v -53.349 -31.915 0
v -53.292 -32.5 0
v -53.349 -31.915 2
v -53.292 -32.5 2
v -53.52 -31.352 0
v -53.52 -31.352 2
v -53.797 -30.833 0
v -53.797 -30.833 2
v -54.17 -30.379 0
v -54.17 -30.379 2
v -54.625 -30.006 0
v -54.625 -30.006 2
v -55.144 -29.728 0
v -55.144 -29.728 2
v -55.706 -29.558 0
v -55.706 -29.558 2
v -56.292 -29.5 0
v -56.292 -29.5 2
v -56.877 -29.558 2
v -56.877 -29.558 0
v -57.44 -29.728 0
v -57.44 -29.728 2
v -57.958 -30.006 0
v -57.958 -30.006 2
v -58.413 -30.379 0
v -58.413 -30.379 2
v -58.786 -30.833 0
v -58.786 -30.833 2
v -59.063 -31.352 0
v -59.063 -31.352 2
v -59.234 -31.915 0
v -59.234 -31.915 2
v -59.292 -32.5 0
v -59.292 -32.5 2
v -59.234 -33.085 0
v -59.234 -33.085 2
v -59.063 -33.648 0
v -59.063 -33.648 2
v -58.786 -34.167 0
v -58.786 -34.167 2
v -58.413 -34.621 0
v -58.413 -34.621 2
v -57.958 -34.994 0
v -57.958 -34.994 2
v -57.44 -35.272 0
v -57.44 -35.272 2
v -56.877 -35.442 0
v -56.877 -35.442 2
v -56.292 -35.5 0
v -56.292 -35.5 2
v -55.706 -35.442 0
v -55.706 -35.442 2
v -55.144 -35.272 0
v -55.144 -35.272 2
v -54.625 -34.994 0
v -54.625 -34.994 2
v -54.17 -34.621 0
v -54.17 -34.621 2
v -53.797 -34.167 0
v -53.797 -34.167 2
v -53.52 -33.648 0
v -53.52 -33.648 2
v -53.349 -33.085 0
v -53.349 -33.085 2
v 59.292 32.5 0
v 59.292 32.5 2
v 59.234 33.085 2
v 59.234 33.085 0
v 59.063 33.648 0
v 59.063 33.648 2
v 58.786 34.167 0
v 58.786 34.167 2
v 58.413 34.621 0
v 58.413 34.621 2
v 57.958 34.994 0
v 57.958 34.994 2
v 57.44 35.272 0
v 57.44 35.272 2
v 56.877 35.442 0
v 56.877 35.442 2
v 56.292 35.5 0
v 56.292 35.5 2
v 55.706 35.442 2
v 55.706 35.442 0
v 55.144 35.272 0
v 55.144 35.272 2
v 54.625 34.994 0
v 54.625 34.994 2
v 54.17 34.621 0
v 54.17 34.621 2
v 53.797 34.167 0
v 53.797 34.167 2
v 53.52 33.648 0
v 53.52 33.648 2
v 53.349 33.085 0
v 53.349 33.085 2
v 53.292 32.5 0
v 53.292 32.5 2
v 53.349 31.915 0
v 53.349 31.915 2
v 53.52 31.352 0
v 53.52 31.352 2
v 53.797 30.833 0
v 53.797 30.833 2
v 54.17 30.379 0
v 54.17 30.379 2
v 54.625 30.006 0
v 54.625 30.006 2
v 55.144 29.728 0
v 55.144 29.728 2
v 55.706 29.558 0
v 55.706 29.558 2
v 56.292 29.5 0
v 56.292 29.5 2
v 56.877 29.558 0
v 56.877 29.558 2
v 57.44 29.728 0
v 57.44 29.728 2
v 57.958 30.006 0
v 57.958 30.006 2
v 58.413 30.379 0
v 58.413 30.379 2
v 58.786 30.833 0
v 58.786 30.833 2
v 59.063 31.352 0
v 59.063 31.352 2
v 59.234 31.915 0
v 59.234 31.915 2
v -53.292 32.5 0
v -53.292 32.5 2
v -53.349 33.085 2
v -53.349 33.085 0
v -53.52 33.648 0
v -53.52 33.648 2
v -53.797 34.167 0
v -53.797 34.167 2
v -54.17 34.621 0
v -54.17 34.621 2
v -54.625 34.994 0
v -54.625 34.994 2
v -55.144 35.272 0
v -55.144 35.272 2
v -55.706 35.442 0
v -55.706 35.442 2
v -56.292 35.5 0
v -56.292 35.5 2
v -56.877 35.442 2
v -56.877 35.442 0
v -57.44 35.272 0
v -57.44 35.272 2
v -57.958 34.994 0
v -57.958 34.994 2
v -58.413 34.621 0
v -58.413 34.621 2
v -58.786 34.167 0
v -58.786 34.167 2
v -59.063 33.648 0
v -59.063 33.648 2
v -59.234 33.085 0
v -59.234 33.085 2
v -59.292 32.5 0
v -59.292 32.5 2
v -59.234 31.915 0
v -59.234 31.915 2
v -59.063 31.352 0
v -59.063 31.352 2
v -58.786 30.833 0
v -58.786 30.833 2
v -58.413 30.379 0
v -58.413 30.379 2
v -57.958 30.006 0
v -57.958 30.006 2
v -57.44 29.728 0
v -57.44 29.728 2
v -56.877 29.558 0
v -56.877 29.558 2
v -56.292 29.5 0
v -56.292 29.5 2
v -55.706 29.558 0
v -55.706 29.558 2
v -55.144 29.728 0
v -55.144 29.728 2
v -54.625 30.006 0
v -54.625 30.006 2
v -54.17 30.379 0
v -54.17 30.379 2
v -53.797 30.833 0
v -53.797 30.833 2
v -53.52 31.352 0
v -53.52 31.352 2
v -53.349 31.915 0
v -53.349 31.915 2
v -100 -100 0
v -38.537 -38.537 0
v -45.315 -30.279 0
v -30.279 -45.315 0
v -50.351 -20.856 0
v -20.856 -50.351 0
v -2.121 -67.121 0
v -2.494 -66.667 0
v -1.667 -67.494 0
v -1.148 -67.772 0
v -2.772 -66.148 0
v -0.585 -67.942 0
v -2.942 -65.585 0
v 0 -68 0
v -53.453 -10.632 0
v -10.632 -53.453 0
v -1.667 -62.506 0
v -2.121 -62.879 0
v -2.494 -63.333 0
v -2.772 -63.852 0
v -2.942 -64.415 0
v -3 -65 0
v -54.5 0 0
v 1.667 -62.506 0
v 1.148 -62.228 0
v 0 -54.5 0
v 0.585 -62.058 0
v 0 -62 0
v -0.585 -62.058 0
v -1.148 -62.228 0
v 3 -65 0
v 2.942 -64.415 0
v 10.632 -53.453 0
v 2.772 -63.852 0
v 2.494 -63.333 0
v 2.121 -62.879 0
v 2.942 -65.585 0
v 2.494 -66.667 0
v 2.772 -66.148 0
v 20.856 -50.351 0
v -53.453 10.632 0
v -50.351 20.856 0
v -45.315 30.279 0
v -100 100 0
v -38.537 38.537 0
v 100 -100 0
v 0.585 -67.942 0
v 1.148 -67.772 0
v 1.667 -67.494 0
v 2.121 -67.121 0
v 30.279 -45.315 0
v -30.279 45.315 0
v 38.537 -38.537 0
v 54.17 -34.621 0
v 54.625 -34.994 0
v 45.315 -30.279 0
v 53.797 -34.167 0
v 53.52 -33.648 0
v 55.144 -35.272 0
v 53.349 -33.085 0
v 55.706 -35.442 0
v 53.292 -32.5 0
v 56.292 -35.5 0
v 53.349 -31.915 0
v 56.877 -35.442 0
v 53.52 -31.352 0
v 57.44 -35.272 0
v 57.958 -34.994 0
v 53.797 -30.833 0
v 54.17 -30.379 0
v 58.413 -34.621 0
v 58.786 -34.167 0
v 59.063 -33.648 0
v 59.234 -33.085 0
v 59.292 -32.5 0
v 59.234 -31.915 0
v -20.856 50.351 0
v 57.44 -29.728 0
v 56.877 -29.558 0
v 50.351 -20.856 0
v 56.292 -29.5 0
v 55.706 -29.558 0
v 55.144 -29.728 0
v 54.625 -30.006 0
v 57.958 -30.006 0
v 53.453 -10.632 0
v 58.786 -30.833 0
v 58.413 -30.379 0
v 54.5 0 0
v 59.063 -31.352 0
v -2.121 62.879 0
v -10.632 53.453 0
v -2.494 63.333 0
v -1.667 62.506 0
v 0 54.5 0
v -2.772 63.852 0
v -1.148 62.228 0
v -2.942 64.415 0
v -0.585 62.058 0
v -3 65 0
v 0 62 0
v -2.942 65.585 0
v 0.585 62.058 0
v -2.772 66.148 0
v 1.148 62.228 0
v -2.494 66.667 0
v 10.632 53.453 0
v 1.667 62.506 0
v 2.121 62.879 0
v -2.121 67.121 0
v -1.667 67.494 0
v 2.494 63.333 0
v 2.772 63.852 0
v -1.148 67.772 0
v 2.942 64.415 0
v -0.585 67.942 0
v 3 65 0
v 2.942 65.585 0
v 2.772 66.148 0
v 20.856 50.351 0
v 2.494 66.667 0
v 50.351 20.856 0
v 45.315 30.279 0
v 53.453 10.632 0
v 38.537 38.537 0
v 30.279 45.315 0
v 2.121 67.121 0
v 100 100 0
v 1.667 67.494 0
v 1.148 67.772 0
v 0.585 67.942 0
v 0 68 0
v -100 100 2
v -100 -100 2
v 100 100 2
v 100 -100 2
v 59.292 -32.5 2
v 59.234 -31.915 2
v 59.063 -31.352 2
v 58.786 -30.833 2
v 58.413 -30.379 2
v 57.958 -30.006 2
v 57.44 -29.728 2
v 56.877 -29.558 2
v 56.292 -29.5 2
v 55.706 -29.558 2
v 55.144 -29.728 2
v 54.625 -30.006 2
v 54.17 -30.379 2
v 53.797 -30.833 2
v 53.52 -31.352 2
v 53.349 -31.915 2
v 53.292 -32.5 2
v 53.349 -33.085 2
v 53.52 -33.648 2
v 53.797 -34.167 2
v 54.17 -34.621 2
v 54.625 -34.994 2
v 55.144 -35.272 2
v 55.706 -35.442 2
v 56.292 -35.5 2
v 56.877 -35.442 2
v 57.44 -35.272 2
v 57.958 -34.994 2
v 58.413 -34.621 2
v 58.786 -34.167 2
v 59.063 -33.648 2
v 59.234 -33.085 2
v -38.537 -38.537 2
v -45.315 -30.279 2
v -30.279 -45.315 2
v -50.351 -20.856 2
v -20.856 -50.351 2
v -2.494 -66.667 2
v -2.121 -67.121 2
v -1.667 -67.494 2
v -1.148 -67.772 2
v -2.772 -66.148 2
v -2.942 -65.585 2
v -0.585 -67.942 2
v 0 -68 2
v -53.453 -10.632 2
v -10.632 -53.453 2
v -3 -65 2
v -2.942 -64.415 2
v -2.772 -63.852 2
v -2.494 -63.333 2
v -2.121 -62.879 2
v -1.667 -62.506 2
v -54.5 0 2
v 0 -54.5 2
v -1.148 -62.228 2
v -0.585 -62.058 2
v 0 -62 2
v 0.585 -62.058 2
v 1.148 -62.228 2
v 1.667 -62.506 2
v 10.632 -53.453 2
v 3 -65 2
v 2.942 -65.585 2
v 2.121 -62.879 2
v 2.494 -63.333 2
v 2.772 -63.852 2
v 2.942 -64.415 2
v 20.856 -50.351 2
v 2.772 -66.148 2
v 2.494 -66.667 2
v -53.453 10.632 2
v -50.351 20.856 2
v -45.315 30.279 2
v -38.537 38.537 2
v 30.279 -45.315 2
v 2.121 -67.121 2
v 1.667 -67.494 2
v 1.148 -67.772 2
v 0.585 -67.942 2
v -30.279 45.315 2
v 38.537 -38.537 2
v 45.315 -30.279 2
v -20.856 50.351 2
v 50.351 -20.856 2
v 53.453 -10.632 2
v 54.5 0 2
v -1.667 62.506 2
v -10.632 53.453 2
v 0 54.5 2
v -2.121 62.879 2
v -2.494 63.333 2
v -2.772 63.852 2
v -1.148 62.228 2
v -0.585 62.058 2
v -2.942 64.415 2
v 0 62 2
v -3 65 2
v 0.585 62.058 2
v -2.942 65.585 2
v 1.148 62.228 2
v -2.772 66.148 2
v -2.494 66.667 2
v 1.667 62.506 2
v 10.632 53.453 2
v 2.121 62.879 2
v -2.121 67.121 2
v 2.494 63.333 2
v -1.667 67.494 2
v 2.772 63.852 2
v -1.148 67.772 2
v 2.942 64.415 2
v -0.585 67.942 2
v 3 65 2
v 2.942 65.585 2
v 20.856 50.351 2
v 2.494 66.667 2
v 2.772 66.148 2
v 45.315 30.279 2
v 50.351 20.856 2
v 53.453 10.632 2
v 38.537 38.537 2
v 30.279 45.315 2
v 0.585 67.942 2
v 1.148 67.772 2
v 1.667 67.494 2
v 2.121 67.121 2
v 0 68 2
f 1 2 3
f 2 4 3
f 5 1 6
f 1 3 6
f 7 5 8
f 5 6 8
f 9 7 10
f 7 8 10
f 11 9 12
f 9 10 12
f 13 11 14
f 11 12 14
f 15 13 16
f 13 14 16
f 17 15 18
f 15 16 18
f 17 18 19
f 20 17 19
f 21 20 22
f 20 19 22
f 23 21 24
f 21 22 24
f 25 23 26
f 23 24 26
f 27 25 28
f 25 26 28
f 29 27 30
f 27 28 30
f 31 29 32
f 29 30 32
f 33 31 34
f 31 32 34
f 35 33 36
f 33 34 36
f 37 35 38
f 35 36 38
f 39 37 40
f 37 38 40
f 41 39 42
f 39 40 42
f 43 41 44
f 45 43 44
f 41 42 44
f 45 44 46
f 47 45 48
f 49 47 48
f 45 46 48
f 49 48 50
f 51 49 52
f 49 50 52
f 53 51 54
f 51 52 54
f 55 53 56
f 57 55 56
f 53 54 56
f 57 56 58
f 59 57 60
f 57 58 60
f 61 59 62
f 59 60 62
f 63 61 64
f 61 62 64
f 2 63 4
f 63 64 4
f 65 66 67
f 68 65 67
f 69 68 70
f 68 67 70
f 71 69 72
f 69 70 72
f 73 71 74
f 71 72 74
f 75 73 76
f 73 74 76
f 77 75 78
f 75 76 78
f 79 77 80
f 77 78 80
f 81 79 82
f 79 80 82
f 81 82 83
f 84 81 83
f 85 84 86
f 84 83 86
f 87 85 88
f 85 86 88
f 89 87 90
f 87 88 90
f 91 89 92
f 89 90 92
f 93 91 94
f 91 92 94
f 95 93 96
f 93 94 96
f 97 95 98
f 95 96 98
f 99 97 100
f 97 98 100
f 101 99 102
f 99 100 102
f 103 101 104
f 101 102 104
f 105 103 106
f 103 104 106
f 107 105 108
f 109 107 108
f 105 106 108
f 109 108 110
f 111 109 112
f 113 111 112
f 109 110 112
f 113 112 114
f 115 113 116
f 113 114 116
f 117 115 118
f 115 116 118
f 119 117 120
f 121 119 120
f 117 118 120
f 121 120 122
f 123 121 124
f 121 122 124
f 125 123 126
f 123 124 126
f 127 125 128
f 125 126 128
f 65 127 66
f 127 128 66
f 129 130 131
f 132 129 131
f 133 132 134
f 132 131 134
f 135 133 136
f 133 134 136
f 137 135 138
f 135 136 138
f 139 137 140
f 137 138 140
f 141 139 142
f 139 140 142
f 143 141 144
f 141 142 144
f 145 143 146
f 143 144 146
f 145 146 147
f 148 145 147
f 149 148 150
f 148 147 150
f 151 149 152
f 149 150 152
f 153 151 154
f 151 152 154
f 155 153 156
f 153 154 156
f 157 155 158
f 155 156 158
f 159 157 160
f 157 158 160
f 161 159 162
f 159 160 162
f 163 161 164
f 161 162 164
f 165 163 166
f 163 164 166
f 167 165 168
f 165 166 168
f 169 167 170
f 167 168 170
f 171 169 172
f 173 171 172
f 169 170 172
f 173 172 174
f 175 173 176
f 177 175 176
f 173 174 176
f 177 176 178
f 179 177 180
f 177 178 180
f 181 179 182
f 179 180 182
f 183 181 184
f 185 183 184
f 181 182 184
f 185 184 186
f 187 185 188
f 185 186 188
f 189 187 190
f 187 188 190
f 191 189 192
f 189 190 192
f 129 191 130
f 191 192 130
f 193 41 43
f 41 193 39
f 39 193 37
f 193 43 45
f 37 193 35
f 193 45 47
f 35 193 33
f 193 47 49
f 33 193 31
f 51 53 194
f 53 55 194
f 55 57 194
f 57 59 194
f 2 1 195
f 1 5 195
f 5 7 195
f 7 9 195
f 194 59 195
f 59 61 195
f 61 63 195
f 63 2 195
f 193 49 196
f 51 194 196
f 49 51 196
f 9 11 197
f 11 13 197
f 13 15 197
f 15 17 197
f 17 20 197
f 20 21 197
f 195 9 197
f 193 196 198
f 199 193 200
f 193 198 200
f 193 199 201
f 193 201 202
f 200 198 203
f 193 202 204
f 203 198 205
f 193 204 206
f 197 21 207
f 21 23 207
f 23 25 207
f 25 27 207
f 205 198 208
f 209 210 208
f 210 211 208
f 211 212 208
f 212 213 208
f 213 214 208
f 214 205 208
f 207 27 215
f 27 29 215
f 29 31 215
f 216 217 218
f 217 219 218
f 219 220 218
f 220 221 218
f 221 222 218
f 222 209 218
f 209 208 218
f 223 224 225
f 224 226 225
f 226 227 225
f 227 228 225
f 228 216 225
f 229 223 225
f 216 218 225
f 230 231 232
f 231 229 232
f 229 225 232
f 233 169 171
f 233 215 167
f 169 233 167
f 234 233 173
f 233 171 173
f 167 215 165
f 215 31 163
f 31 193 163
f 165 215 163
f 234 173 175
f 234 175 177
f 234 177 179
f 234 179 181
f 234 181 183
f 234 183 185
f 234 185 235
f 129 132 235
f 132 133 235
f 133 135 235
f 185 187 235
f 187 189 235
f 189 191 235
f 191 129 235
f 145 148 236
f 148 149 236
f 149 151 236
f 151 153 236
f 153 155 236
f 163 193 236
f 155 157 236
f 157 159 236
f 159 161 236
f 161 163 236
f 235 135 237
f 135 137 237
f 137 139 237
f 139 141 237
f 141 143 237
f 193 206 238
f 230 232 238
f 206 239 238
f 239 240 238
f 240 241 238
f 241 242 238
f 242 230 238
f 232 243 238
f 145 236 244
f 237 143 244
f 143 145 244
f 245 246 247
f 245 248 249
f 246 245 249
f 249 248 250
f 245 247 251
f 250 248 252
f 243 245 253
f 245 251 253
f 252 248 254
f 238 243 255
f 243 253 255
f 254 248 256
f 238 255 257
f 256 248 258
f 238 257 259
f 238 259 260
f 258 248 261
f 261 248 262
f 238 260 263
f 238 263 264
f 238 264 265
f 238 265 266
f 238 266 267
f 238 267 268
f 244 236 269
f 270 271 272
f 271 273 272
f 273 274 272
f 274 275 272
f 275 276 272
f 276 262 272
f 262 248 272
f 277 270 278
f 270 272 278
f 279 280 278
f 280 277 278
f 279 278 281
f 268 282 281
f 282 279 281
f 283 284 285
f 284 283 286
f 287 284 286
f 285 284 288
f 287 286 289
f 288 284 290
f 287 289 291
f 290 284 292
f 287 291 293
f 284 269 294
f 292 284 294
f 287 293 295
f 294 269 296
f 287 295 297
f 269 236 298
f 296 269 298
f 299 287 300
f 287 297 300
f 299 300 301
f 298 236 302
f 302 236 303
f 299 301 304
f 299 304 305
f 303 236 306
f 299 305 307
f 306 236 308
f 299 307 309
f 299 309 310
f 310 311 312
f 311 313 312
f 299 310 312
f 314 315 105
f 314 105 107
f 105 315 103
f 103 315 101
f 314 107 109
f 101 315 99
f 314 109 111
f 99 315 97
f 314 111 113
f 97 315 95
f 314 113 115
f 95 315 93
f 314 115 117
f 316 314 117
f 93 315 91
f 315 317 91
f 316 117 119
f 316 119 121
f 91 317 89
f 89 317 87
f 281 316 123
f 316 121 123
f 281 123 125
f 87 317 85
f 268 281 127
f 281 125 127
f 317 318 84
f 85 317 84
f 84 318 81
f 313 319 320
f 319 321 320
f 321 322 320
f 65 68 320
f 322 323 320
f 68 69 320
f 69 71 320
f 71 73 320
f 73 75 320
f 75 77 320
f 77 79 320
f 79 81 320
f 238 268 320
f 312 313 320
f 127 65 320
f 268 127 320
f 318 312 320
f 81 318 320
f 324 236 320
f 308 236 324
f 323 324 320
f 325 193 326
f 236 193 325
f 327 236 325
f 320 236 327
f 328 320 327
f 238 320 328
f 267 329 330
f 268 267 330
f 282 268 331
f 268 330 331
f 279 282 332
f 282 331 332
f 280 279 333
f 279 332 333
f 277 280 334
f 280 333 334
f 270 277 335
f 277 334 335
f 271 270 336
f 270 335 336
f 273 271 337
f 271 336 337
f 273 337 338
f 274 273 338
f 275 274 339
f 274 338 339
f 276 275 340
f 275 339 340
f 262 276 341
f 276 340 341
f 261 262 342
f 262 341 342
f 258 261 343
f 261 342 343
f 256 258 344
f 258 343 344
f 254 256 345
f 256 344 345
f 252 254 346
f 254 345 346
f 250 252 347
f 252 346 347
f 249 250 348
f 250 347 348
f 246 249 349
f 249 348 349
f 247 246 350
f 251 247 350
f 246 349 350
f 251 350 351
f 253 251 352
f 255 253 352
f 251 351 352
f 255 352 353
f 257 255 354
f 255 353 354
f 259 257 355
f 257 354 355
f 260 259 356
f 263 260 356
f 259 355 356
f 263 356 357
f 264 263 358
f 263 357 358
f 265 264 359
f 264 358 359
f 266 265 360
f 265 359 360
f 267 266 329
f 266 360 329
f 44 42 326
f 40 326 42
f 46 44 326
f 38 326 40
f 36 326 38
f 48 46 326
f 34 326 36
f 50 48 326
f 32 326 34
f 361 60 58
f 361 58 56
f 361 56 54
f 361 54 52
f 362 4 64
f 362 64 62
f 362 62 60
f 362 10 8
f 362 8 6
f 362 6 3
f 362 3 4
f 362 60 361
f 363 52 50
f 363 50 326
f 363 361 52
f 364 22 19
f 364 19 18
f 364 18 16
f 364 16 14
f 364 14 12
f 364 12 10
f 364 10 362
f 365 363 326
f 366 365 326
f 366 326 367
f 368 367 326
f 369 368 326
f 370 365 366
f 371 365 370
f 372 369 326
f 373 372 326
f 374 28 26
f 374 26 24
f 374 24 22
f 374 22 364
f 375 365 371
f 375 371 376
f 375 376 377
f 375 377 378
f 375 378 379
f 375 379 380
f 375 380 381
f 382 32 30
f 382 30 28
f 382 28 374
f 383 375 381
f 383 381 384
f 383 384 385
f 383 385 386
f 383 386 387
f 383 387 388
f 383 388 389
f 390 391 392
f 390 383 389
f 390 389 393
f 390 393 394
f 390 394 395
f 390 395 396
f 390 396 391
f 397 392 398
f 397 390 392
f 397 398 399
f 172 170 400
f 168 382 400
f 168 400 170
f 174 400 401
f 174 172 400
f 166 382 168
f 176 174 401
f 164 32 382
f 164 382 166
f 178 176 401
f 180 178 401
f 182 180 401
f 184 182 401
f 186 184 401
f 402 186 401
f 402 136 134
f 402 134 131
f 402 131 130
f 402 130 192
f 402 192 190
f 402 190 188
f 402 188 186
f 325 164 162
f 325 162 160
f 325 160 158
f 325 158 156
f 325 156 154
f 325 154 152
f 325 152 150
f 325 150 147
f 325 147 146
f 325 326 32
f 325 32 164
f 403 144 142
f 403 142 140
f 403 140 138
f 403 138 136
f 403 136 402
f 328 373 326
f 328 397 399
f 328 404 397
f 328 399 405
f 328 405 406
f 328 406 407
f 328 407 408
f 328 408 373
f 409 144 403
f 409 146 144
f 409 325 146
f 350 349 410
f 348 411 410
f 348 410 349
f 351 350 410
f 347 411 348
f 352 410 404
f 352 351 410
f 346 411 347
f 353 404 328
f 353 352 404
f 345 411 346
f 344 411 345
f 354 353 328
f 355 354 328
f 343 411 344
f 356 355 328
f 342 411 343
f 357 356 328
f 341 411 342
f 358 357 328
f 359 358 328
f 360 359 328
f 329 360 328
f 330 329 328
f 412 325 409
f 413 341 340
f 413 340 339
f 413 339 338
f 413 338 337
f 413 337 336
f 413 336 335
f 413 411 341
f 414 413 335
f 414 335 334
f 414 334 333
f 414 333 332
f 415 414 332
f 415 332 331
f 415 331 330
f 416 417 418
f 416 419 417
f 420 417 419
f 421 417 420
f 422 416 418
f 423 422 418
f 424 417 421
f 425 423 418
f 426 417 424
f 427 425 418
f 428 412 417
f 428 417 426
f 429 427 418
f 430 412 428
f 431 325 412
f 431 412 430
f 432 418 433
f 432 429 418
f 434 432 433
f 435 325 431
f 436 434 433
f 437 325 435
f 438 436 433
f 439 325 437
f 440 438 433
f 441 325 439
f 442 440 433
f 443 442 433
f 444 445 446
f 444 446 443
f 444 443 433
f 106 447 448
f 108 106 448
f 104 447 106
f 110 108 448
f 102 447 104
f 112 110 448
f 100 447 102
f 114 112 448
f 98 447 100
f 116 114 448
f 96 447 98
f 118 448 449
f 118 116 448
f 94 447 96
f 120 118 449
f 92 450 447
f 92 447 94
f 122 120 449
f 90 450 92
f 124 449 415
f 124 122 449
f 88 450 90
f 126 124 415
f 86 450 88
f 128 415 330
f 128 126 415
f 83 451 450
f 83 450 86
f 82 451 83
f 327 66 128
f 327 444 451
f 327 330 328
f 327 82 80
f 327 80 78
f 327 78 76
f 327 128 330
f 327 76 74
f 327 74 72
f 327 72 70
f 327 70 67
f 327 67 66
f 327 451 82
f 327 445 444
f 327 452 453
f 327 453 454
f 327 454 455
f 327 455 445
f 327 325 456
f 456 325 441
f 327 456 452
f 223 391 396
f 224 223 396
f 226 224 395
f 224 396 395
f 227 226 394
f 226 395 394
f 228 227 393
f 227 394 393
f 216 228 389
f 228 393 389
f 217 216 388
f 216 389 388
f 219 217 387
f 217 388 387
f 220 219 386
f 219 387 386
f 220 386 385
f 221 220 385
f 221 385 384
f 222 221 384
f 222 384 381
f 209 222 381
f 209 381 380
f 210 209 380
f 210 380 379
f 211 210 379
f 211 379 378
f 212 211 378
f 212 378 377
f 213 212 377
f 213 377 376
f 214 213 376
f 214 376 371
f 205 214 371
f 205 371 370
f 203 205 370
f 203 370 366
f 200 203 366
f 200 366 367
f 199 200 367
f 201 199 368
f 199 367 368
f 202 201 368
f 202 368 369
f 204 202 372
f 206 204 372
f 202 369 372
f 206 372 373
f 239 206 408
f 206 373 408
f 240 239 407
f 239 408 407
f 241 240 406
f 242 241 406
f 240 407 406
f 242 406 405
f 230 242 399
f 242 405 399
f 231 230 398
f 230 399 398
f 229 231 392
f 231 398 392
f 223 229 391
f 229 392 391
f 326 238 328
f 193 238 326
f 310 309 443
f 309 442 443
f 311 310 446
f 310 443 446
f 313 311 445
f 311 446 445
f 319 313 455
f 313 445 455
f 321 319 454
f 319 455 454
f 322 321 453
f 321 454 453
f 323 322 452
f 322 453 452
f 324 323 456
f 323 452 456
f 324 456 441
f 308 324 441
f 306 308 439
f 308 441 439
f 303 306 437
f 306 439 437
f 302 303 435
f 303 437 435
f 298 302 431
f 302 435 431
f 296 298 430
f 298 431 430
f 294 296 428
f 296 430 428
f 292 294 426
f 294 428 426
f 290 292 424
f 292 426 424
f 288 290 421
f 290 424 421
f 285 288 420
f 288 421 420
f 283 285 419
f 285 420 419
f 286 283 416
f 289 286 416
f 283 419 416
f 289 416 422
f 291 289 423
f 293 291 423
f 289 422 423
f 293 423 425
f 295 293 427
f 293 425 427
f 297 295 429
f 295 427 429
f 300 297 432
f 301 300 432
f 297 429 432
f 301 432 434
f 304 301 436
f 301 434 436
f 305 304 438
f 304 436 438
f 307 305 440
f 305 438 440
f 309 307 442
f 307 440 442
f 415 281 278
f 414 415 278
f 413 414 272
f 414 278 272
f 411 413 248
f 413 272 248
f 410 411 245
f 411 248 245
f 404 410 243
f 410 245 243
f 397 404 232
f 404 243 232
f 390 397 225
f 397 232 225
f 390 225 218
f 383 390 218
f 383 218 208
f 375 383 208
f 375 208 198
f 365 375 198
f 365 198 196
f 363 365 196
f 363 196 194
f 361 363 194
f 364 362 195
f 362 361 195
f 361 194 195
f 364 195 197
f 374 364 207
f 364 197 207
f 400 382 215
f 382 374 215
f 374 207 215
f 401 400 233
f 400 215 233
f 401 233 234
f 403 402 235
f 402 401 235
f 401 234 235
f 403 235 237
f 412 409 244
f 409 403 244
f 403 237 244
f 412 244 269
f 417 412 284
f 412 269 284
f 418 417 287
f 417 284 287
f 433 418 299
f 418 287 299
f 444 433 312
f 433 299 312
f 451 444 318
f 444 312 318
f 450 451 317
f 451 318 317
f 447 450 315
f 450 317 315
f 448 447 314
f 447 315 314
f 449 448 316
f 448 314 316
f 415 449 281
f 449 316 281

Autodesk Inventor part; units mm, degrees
ref_plane "YZ Plane" through (0, 0, 0) normal (1, 0, 0) x (0, 1, 0)
ref_plane "XZ Plane" through (0, 0, 0) normal (0, 1, 0) x (-1, 0, 0)
ref_plane "XY Plane" through (0, 0, 0) normal (0, 0, 1) x (1, 0, 0)
sketch "Sketch1" plane through (0, 0, 0) normal (0, 0, 1) x (1, 0, 0)
  circle A0 centre (0, 0) radius 54.5
  line L0 (-100, 100) -> (100, 100)
  line L1 (100, 100) -> (100, -100)
  line L2 (100, -100) -> (-100, -100)
  line L3 (-100, -100) -> (-100, 100)
  dimension "d0" = 109
  dimension "d3" = 200
  dimension "d4" = 200
extrude "Extrusion1" add sketch "Sketch1" along normal blind 2
sketch "Sketch2" plane through (0, 0, 2) normal (0, 0, 1) x (1, 0, 0)
  circle A0 centre (0, 65) radius 3
  circle A1 centre (-56.2917, 32.5) radius 3
  circle A2 centre (-56.2917, -32.5) radius 3
  circle A3 centre (0, -65) radius 3
  circle A4 centre (56.2917, -32.5) radius 3
  circle A5 centre (56.2917, 32.5) radius 3
  circle A6 centre (0, 0) radius 65
  dimension "d8" = 6
  dimension "d11" = 360
extrude "Extrusion2" cut sketch "Sketch2" against normal blind 2 contours A0 A6 | A6 A0 | A6 A1 | A1 A6 | A6 A5 | A5 A6 | A6 A2 | A2 A6 | A6 A4 | A4 A6 | A6 A3 | A3 A6
properties part number "uppe sheet"
